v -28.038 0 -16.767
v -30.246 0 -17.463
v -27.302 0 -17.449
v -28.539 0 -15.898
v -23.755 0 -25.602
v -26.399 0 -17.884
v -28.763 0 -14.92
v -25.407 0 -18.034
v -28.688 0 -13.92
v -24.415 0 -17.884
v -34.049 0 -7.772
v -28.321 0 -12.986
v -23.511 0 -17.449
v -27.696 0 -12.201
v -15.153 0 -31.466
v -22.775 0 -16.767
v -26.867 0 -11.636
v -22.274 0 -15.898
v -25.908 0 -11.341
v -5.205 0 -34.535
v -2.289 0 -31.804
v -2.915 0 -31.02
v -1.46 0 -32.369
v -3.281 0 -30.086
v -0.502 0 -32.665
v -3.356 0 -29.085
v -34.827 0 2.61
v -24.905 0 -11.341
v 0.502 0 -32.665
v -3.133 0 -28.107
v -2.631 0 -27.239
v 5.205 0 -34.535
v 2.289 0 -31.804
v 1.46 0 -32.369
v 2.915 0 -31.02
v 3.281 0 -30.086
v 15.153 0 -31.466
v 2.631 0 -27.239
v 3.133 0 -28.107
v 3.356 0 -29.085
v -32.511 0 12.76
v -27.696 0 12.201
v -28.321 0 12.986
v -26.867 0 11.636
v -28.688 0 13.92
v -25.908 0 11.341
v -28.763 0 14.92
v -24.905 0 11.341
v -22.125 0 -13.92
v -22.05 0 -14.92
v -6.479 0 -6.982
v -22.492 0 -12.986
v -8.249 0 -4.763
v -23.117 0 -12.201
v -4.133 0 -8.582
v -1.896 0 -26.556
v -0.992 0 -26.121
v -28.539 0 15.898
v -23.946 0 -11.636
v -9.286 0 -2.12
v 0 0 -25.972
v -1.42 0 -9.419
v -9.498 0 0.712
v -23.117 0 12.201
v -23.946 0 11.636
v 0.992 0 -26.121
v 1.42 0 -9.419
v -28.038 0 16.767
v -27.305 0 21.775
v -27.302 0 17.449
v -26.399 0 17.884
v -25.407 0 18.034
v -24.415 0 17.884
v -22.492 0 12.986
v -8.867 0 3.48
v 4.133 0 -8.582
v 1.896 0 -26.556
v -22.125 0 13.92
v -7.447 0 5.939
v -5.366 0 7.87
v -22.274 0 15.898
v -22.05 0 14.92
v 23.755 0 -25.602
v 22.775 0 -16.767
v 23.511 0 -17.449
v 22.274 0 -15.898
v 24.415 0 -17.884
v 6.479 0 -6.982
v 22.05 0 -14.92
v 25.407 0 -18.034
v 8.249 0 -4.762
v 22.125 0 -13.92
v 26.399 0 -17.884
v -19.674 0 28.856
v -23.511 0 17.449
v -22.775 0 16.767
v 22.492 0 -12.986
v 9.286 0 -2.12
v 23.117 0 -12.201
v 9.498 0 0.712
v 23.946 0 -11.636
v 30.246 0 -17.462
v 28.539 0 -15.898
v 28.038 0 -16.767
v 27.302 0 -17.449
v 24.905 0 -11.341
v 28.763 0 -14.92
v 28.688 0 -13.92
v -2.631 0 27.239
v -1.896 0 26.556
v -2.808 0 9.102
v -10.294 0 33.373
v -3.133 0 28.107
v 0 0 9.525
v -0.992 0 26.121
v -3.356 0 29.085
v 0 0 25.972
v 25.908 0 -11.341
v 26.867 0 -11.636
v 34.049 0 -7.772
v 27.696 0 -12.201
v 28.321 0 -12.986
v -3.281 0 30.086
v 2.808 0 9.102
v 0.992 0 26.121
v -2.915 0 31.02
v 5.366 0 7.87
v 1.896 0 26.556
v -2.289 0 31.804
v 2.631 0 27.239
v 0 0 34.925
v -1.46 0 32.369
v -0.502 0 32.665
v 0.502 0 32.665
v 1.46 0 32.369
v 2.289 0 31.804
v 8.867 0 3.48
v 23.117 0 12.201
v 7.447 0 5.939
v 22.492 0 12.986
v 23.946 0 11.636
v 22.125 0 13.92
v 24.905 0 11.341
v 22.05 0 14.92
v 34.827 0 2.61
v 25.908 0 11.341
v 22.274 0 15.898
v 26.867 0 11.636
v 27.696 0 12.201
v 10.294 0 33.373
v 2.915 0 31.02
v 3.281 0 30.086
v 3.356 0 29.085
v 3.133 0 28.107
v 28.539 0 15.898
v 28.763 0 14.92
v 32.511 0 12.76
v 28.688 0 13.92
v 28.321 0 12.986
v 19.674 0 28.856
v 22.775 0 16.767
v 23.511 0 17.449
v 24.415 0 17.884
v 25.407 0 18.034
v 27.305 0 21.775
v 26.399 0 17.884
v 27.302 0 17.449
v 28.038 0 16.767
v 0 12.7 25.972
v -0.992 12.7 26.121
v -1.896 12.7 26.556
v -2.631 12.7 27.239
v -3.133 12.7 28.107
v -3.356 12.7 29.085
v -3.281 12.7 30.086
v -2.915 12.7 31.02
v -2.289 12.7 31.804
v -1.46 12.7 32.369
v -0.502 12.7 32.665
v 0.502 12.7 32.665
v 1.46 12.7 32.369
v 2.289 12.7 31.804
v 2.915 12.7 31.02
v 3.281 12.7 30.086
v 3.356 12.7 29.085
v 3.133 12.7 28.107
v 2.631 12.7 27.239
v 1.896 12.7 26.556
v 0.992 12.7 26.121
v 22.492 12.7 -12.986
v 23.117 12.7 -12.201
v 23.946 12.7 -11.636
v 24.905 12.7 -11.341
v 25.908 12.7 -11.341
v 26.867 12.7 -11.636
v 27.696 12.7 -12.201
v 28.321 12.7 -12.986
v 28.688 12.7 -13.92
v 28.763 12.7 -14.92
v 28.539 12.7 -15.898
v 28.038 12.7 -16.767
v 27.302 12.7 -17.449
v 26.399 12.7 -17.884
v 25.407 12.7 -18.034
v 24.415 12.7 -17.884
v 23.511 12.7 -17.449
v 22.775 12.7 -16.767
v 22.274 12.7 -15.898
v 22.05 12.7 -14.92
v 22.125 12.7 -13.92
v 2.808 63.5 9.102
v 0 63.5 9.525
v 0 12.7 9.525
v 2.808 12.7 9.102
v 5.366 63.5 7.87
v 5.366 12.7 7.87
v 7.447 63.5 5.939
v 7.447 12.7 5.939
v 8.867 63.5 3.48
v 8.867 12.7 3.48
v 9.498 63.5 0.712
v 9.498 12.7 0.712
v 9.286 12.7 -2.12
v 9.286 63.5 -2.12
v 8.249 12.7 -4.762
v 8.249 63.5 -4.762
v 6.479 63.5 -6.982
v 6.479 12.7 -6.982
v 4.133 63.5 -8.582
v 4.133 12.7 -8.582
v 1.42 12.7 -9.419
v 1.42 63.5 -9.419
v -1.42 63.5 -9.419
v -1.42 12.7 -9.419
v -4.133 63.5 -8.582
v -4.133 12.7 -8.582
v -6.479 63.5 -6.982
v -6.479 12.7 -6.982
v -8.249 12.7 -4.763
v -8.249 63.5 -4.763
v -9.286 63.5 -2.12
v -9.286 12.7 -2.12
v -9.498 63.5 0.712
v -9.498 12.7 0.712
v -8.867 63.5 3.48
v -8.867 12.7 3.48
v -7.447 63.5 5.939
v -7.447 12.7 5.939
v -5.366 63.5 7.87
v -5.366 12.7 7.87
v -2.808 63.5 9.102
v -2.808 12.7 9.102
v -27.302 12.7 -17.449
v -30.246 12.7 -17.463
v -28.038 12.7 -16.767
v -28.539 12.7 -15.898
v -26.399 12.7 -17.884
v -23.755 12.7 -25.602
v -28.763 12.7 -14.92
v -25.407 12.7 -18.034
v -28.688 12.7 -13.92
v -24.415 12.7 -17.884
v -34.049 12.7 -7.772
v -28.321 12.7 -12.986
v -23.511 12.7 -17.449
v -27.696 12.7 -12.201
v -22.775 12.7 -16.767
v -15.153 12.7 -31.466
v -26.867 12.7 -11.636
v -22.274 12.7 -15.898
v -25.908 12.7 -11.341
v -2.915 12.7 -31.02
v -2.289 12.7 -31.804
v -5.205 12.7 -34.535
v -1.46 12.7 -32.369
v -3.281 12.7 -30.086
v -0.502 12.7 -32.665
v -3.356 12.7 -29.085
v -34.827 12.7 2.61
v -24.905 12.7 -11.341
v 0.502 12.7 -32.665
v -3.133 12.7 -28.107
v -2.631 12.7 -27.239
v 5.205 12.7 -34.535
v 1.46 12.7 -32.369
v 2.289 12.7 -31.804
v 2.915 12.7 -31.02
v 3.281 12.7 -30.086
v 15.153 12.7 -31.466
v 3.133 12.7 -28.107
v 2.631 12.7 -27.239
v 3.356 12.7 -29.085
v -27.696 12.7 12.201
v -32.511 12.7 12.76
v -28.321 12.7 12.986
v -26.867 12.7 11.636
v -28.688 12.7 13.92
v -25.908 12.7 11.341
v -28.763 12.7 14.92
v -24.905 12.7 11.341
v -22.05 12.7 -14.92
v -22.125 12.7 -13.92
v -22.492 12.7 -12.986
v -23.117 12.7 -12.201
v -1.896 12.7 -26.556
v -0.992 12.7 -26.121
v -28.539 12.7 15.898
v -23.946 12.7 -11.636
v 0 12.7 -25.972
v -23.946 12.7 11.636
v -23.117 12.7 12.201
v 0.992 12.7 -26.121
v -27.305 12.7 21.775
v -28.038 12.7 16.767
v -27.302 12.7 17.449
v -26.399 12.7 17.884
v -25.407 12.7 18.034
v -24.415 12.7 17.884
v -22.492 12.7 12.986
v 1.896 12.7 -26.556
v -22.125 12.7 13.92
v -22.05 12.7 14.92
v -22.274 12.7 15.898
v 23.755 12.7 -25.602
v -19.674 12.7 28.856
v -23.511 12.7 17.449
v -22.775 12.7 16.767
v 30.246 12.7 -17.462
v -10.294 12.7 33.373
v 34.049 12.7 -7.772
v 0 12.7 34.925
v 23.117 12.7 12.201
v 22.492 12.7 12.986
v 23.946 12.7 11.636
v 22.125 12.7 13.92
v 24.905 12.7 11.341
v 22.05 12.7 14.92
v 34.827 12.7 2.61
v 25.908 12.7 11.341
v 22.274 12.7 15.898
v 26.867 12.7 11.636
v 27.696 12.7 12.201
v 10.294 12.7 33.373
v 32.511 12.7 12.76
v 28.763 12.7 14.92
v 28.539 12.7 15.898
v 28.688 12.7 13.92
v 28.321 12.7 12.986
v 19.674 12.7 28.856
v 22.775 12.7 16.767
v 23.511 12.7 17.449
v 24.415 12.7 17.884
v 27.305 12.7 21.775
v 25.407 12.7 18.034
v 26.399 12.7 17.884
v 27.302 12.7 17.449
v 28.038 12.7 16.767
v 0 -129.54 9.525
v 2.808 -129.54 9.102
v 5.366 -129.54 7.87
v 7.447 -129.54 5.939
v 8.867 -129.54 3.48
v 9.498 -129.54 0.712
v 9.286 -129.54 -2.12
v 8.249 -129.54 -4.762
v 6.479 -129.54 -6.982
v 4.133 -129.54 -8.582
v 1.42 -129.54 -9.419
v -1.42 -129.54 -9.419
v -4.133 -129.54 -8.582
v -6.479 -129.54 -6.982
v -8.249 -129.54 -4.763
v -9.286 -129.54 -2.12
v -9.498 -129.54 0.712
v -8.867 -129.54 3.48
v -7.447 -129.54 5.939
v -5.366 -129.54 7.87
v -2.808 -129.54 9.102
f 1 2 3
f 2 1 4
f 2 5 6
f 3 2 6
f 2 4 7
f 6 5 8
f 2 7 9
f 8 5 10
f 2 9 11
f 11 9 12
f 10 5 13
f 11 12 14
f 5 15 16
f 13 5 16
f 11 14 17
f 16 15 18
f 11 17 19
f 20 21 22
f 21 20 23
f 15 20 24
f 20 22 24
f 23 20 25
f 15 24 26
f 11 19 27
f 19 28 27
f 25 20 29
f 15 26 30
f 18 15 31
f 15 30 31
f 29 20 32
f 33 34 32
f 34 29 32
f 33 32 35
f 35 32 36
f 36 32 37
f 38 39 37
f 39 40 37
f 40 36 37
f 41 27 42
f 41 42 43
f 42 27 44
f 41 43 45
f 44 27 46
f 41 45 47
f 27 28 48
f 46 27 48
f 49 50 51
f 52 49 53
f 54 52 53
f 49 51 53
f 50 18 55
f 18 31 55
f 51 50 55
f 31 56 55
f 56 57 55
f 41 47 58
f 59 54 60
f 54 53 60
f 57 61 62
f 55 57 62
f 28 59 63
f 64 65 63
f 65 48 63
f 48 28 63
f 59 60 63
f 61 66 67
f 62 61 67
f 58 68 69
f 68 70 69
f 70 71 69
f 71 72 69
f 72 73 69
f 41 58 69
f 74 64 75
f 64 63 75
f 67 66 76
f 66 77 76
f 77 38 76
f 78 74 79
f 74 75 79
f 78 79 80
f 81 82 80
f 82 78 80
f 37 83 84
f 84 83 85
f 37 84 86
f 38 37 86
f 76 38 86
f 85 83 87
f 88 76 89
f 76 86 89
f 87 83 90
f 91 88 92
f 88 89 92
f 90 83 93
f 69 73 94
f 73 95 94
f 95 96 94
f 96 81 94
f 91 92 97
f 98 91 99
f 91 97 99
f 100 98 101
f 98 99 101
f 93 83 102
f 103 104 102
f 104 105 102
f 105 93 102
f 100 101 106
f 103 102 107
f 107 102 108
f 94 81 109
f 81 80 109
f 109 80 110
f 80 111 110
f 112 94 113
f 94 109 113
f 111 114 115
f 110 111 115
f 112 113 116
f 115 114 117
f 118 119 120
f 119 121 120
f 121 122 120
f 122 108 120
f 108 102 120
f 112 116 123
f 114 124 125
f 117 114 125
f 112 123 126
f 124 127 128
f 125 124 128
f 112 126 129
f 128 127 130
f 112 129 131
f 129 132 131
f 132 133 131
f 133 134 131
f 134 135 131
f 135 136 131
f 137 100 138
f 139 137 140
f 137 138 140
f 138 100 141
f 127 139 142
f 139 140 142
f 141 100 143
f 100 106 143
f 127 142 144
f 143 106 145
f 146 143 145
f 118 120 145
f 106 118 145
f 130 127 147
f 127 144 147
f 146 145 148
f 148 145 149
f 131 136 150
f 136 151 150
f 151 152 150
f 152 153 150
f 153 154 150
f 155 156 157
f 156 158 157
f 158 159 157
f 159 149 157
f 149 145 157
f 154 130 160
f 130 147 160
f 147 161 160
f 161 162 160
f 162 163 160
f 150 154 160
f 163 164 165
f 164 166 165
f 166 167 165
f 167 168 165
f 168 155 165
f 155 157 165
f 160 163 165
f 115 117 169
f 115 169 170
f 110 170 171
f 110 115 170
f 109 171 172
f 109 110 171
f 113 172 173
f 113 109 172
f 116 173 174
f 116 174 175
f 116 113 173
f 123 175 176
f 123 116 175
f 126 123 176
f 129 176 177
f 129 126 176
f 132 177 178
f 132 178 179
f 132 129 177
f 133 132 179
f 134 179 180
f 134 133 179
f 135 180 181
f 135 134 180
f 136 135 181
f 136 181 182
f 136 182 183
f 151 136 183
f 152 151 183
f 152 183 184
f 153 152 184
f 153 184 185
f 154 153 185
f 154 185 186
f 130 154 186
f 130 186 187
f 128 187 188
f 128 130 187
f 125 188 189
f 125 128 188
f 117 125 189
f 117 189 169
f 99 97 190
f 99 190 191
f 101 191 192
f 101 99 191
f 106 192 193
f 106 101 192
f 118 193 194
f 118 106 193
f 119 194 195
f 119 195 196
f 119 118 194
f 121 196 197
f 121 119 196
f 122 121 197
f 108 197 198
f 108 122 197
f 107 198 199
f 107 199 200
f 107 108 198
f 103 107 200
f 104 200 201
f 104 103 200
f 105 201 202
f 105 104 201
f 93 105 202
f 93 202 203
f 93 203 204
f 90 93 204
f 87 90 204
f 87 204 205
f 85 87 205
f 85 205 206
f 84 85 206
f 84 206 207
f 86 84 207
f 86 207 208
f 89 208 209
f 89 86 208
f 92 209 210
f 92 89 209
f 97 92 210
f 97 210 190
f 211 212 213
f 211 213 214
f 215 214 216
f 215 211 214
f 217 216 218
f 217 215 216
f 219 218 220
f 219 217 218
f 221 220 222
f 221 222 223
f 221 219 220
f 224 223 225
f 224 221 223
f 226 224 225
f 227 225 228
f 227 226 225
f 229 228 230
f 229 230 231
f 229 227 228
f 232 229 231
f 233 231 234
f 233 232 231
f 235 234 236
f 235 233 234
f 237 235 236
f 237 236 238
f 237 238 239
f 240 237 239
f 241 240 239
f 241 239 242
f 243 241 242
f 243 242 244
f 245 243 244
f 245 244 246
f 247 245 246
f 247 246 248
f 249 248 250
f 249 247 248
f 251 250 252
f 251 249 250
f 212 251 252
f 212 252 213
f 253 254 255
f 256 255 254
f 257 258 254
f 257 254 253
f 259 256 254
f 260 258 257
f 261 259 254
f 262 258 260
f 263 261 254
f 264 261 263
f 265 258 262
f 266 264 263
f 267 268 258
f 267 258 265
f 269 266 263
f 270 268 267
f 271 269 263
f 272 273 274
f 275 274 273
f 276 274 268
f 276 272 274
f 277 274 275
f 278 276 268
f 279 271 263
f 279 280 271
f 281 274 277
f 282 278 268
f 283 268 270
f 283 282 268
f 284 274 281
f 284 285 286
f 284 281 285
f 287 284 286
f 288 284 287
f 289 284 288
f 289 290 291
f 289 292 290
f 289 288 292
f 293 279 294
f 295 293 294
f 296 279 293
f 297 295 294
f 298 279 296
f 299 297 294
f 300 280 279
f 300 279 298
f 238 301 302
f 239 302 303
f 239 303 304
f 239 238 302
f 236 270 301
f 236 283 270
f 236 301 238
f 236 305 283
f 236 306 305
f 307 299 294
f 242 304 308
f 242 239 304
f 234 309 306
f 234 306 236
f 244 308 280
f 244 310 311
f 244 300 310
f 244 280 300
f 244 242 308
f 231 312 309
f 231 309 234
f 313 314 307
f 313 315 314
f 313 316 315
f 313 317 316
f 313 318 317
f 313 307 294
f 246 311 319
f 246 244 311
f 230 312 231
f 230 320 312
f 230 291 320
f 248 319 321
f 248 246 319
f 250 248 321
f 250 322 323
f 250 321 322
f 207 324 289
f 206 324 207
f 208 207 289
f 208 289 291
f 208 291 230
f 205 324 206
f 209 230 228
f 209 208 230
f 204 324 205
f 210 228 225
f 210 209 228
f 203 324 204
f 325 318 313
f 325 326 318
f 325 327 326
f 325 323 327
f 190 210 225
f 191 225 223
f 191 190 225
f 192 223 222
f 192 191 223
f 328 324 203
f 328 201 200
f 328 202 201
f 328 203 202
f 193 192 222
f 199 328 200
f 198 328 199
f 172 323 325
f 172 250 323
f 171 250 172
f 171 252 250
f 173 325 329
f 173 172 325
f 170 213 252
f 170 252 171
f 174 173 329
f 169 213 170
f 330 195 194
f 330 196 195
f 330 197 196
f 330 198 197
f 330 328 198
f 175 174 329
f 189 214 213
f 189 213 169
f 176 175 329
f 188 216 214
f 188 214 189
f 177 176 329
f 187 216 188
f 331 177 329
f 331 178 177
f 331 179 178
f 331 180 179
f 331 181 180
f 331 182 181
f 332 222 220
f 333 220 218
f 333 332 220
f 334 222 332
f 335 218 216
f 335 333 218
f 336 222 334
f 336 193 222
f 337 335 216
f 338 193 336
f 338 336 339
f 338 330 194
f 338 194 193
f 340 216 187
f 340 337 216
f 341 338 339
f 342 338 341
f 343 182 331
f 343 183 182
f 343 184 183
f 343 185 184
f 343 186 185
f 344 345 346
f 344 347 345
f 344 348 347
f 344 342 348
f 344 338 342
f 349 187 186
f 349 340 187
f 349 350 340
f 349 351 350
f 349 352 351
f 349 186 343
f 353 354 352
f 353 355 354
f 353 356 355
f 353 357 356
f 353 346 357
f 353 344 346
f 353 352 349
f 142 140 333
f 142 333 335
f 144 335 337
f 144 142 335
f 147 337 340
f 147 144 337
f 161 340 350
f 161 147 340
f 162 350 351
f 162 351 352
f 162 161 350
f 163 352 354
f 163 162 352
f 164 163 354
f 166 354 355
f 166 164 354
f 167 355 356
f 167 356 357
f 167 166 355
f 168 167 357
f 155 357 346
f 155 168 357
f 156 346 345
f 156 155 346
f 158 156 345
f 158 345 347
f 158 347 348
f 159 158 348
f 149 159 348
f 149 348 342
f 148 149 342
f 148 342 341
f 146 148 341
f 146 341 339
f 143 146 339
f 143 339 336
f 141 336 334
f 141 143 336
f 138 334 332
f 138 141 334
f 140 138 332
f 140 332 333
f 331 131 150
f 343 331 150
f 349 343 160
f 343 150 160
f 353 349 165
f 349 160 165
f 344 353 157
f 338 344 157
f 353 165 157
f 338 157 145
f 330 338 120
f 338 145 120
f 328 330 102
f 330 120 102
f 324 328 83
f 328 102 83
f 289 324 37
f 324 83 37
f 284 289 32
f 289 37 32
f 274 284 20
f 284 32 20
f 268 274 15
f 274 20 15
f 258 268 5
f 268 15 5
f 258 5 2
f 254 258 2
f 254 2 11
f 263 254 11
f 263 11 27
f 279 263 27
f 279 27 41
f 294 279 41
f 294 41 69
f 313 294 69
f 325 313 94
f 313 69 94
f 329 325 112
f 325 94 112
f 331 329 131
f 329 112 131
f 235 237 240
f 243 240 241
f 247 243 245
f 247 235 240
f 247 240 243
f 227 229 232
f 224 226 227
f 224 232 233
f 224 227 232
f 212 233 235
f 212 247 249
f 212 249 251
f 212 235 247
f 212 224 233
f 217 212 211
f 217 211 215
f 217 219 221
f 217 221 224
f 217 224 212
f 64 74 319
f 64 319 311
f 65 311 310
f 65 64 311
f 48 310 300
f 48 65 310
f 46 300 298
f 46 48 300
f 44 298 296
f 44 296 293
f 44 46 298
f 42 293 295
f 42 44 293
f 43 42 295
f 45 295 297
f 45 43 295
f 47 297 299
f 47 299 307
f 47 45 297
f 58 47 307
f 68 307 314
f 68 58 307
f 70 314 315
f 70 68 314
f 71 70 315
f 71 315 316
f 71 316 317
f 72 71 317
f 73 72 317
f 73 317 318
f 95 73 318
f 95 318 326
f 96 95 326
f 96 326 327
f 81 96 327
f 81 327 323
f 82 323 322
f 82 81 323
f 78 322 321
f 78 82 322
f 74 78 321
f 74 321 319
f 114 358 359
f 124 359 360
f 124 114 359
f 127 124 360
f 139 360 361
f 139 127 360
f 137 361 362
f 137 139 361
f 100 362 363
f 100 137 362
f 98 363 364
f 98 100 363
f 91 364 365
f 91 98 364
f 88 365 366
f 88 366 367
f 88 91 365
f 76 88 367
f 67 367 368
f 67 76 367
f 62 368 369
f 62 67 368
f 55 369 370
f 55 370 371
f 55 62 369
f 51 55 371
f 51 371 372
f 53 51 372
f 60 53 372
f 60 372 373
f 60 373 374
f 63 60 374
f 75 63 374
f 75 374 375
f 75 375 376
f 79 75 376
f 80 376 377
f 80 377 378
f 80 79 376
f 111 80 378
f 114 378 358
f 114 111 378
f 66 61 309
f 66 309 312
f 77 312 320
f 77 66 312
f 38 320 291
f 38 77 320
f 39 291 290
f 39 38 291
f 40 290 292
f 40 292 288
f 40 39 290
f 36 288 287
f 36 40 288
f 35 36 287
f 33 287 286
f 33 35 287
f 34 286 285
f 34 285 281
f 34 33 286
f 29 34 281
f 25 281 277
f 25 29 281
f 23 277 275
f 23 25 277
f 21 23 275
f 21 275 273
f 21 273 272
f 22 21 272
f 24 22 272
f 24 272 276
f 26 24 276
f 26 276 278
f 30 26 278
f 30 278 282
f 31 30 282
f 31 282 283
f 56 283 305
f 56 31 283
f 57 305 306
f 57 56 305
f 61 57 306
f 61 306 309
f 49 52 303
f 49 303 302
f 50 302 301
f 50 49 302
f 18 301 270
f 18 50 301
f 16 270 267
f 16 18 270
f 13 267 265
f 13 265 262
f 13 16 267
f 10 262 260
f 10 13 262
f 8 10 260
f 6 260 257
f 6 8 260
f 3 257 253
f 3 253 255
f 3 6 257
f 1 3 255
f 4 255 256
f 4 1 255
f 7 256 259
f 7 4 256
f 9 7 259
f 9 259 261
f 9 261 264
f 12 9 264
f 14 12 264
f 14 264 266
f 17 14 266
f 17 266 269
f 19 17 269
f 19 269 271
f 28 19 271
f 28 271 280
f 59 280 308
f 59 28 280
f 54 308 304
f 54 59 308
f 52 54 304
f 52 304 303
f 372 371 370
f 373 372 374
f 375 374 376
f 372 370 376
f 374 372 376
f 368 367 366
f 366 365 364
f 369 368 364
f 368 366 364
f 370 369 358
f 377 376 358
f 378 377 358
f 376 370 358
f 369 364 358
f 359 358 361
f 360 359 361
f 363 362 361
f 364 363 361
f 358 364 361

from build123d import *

# Parameters (mm, degrees)
SKETCH1_R          = 34.925
EXTRUDE1_DEPTH     = 12.7
SKETCH3_R          = 3.3655
CUT_EXTRUDE2_DEPTH = 12.7
CIRPATTERN1_COUNT  = 6
SKETCH5_R          = 9.525
EXTRUDE2_DEPTH     = 129.54
EXTRUDE3_START     = 50.8
SKETCH6_R          = 9.525
EXTRUDE3_DEPTH     = 50.8


with BuildPart() as part:
    # Sketch1 → Extrude1 (new body)
    with BuildSketch(Plane(origin=(0, 0, 0), x_dir=(1, 0, 0), z_dir=(0, 1, 0))):
        Circle(SKETCH1_R)
    extrude(amount=EXTRUDE1_DEPTH)

    # Sketch3 → Cut-Extrude2 (cut)
    with BuildSketch(Plane(origin=(0, 0, 0), x_dir=(1, 0, 0), z_dir=(0, 1, 0))):
        with Locations((0, 29.337)):
            Circle(SKETCH3_R)
    cut_extrude2 = extrude(amount=CUT_EXTRUDE2_DEPTH, mode=Mode.SUBTRACT)

    # CirPattern1: Cut-Extrude2 ×6 about axis
    cirpattern1_axis = Axis((0, 35.858162691, 0), (0, -1, 0))
    for i in range(1, CIRPATTERN1_COUNT):
        add(cut_extrude2.rotate(cirpattern1_axis, i * 360 / CIRPATTERN1_COUNT), mode=Mode.SUBTRACT)

    # Sketch5 → Extrude2 (add)
    with BuildSketch(Plane(origin=(0, 0, 0), x_dir=(1, 0, 0), z_dir=(0, 1, 0))):
        Circle(SKETCH5_R)
    extrude(amount=-EXTRUDE2_DEPTH)

    # Sketch6 → Extrude3 (add)
    with BuildSketch(Plane(origin=(0, 12.7, 0), x_dir=(-1, 0, 0), z_dir=(0, 1, 0)).offset(EXTRUDE3_START)):
        Circle(SKETCH6_R)
    extrude(amount=-EXTRUDE3_DEPTH)


solid = part.part
